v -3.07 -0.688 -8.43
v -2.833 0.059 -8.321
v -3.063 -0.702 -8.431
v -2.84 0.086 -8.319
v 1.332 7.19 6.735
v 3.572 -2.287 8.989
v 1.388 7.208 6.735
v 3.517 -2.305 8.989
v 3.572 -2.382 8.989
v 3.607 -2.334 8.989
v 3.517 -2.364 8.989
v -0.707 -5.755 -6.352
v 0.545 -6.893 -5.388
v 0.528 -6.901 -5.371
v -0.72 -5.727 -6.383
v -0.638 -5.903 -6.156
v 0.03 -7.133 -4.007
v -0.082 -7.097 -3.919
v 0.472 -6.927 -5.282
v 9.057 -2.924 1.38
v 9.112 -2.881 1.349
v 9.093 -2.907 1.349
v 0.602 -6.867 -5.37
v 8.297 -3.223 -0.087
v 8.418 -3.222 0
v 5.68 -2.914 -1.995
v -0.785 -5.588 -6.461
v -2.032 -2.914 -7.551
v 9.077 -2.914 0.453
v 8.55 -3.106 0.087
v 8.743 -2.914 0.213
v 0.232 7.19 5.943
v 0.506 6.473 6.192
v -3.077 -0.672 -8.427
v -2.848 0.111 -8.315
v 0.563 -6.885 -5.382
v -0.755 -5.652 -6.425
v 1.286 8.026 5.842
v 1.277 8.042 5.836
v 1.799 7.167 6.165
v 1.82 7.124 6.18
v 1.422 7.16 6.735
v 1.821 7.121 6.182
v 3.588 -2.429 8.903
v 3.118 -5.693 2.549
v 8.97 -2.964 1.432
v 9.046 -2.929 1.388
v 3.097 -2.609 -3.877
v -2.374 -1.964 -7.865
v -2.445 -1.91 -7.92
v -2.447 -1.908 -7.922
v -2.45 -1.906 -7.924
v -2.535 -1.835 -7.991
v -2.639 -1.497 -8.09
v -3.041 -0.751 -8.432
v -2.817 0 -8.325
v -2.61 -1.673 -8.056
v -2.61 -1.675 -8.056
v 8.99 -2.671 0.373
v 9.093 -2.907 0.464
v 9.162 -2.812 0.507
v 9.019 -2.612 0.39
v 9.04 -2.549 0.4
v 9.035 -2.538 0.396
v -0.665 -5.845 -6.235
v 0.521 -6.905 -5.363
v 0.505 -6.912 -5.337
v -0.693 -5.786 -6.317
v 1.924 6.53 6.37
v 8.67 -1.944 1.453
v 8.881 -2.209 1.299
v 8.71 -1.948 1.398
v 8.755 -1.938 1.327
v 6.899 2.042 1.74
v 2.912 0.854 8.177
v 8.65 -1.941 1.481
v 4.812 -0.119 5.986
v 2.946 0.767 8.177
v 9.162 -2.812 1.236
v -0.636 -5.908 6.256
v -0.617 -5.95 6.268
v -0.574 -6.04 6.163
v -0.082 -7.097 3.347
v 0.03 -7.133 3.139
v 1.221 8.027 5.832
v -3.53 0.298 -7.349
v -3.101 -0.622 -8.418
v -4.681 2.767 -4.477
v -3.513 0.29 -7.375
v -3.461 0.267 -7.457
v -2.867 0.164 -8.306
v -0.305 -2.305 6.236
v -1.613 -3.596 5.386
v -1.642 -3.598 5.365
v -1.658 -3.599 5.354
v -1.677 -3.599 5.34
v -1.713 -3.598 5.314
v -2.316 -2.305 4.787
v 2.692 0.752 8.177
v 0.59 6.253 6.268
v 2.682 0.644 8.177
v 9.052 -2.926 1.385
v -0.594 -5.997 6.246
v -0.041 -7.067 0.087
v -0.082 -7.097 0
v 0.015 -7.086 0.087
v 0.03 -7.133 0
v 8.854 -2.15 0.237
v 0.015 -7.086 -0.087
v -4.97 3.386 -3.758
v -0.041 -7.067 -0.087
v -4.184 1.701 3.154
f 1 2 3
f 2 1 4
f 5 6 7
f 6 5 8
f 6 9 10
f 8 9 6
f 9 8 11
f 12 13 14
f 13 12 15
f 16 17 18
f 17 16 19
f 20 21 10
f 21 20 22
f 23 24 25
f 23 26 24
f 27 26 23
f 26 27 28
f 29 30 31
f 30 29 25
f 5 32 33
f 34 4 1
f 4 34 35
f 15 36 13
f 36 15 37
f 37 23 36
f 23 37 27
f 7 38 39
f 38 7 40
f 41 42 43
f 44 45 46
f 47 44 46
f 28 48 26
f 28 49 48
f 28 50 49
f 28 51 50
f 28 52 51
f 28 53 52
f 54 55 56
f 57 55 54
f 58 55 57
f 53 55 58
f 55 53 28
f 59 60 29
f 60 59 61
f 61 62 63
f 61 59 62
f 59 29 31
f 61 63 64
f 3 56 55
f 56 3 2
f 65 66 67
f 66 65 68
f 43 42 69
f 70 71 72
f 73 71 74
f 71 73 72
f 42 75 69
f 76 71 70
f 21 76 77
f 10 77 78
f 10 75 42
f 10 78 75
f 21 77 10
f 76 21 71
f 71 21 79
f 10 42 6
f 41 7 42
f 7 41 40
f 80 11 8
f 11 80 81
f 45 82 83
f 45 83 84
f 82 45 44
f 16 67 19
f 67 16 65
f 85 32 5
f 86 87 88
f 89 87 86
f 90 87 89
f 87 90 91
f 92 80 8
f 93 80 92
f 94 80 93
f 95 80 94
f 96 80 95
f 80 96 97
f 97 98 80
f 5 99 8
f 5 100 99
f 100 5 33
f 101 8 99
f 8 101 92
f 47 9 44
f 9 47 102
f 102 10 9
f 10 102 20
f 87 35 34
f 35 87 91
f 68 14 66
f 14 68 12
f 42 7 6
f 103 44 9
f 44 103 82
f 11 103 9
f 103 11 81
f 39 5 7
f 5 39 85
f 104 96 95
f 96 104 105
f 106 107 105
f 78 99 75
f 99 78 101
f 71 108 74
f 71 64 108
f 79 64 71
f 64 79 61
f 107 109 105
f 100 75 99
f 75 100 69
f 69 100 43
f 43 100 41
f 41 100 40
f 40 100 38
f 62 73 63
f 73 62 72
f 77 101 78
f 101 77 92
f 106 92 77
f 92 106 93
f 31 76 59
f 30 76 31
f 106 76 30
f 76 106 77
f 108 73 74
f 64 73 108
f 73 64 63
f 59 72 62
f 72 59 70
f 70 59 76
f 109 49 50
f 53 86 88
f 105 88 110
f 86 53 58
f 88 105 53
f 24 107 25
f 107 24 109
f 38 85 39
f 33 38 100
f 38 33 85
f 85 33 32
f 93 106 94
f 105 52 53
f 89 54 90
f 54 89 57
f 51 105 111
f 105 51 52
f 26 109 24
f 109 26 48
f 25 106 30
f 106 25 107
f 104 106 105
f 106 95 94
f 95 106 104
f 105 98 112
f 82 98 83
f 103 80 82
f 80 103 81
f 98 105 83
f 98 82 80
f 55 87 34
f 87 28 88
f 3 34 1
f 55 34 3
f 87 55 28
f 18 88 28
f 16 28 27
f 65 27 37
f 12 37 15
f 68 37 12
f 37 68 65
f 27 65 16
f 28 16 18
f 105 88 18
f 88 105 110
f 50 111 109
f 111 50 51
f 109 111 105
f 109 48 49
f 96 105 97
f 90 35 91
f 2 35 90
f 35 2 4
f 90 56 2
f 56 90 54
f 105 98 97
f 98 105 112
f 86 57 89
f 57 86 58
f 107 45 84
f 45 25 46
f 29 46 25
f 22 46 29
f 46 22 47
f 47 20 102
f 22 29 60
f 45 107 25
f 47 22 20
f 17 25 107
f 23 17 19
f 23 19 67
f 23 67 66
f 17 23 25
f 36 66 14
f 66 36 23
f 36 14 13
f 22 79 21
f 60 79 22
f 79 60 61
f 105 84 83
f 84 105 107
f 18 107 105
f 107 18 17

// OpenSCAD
// Auto-generated OpenSCAD file

    inner_points = 10*[[0.2558824559881848, 1.1134809877530691, 0.5000000000030929], [-0.6504210229442514, 0.6908534873760076, 0.50000000000051], [0.9062393061228075, -0.28117666064270774, -9.353628982466944e-13], [-6.41728096287264e-05, -0.7038041610197694, -3.518157987159043e-12], [0.25588245598941933, 1.1134809877565333, -0.49999999999690703], [-0.6504210229430168, 0.6908534873794716, -0.49999999999948996], [0.6578250941889378, 0.2515351583779428, -0.809016994374344], [-0.24847838474349848, -0.17109234199911882, -0.809016994376927], [0.6578250941869402, 0.251535158372338, 0.8090169943755507], [-0.248478384745496, -0.17109234200472362, 0.8090169943729678], [-0.08864545939497245, 0.6692288945346313, -1.3270070091503023]];

    outer_points = 10*[[0.939271150352653, -0.2914253703744584, 0.0802979287858217], [0.35569526368517285, -0.23342057046774728, 0.8902822667134429], [-0.3735213820712076, -0.2914253703744584, -0.865540194553496], [-0.9570972687386876, -0.23342057046774728, -0.05555585662587481], [0.7207978378522963, 0.6580298560378001, -0.14509990785767551], [0.13722195118481623, 0.7160346559445111, 0.6648844300699457], [-0.09055256736269784, 0.6580298560378001, -0.729660015936789], [-0.674128454030178, 0.7160346559445111, 0.08032432199083217], [0.2629446778976564, -0.8782209710934609, -0.36495865525691407], [-0.3206312087698237, -0.8202161711867498, 0.44502568267070713], [0.04731076808846265, 1.3929484844445685, -0.06566580635435994]];

    // Convex hull for inner set (I)
    module inner_hull() {
        hull() {
            for (p = inner_points) {
                translate(p) sphere(r=0.1);
            }
        }
    }

    // Convex hull for outer set (O) minus inner hull (O \ I)
    module outer_minus_inner() {
        difference() {
            hull() {
                for (p = outer_points) {
                    translate(p) sphere(r=0.1);
                }
            }
            inner_hull(); // Subtract inner hull
        }
    }

    // Convex hull for outer set (O) minus all translated inner hulls
    module outer_minus_AllTranslationInner() {
        difference() {
            hull() {
                for (p = outer_points) {
                    translate(p) sphere(r=0.1);
                }
            }
            hull() {
                translate([0,0,50]) inner_hull();
                translate([0,0,-50]) inner_hull();
            }; // Subtract translated inner hulls
        }
    }

    // Difference between outer_minus_inner and outer_minus_AllTranslationInner
    module outer_minus_inner_diff() {
        difference() {
            // Outer minus inner
            difference() {
                hull() {
                    for (p = outer_points) {
                        translate(p) sphere(r=0.1);
                    }
                }
                inner_hull();
            }

            // Subtract Outer minus AllTranslationInner
            difference() {
                hull() {
                    for (p = outer_points) {
                        translate(p) sphere(r=0.1);
                    }
                }
                hull() {
                    translate([0,0,50]) inner_hull();
                    translate([0,0,-50]) inner_hull();
                };
            }
        }
    }

    // Rendering all with colors applied
    color([1, 1, 0, 1]) outer_minus_inner_diff(); // Opaque yellow
    
